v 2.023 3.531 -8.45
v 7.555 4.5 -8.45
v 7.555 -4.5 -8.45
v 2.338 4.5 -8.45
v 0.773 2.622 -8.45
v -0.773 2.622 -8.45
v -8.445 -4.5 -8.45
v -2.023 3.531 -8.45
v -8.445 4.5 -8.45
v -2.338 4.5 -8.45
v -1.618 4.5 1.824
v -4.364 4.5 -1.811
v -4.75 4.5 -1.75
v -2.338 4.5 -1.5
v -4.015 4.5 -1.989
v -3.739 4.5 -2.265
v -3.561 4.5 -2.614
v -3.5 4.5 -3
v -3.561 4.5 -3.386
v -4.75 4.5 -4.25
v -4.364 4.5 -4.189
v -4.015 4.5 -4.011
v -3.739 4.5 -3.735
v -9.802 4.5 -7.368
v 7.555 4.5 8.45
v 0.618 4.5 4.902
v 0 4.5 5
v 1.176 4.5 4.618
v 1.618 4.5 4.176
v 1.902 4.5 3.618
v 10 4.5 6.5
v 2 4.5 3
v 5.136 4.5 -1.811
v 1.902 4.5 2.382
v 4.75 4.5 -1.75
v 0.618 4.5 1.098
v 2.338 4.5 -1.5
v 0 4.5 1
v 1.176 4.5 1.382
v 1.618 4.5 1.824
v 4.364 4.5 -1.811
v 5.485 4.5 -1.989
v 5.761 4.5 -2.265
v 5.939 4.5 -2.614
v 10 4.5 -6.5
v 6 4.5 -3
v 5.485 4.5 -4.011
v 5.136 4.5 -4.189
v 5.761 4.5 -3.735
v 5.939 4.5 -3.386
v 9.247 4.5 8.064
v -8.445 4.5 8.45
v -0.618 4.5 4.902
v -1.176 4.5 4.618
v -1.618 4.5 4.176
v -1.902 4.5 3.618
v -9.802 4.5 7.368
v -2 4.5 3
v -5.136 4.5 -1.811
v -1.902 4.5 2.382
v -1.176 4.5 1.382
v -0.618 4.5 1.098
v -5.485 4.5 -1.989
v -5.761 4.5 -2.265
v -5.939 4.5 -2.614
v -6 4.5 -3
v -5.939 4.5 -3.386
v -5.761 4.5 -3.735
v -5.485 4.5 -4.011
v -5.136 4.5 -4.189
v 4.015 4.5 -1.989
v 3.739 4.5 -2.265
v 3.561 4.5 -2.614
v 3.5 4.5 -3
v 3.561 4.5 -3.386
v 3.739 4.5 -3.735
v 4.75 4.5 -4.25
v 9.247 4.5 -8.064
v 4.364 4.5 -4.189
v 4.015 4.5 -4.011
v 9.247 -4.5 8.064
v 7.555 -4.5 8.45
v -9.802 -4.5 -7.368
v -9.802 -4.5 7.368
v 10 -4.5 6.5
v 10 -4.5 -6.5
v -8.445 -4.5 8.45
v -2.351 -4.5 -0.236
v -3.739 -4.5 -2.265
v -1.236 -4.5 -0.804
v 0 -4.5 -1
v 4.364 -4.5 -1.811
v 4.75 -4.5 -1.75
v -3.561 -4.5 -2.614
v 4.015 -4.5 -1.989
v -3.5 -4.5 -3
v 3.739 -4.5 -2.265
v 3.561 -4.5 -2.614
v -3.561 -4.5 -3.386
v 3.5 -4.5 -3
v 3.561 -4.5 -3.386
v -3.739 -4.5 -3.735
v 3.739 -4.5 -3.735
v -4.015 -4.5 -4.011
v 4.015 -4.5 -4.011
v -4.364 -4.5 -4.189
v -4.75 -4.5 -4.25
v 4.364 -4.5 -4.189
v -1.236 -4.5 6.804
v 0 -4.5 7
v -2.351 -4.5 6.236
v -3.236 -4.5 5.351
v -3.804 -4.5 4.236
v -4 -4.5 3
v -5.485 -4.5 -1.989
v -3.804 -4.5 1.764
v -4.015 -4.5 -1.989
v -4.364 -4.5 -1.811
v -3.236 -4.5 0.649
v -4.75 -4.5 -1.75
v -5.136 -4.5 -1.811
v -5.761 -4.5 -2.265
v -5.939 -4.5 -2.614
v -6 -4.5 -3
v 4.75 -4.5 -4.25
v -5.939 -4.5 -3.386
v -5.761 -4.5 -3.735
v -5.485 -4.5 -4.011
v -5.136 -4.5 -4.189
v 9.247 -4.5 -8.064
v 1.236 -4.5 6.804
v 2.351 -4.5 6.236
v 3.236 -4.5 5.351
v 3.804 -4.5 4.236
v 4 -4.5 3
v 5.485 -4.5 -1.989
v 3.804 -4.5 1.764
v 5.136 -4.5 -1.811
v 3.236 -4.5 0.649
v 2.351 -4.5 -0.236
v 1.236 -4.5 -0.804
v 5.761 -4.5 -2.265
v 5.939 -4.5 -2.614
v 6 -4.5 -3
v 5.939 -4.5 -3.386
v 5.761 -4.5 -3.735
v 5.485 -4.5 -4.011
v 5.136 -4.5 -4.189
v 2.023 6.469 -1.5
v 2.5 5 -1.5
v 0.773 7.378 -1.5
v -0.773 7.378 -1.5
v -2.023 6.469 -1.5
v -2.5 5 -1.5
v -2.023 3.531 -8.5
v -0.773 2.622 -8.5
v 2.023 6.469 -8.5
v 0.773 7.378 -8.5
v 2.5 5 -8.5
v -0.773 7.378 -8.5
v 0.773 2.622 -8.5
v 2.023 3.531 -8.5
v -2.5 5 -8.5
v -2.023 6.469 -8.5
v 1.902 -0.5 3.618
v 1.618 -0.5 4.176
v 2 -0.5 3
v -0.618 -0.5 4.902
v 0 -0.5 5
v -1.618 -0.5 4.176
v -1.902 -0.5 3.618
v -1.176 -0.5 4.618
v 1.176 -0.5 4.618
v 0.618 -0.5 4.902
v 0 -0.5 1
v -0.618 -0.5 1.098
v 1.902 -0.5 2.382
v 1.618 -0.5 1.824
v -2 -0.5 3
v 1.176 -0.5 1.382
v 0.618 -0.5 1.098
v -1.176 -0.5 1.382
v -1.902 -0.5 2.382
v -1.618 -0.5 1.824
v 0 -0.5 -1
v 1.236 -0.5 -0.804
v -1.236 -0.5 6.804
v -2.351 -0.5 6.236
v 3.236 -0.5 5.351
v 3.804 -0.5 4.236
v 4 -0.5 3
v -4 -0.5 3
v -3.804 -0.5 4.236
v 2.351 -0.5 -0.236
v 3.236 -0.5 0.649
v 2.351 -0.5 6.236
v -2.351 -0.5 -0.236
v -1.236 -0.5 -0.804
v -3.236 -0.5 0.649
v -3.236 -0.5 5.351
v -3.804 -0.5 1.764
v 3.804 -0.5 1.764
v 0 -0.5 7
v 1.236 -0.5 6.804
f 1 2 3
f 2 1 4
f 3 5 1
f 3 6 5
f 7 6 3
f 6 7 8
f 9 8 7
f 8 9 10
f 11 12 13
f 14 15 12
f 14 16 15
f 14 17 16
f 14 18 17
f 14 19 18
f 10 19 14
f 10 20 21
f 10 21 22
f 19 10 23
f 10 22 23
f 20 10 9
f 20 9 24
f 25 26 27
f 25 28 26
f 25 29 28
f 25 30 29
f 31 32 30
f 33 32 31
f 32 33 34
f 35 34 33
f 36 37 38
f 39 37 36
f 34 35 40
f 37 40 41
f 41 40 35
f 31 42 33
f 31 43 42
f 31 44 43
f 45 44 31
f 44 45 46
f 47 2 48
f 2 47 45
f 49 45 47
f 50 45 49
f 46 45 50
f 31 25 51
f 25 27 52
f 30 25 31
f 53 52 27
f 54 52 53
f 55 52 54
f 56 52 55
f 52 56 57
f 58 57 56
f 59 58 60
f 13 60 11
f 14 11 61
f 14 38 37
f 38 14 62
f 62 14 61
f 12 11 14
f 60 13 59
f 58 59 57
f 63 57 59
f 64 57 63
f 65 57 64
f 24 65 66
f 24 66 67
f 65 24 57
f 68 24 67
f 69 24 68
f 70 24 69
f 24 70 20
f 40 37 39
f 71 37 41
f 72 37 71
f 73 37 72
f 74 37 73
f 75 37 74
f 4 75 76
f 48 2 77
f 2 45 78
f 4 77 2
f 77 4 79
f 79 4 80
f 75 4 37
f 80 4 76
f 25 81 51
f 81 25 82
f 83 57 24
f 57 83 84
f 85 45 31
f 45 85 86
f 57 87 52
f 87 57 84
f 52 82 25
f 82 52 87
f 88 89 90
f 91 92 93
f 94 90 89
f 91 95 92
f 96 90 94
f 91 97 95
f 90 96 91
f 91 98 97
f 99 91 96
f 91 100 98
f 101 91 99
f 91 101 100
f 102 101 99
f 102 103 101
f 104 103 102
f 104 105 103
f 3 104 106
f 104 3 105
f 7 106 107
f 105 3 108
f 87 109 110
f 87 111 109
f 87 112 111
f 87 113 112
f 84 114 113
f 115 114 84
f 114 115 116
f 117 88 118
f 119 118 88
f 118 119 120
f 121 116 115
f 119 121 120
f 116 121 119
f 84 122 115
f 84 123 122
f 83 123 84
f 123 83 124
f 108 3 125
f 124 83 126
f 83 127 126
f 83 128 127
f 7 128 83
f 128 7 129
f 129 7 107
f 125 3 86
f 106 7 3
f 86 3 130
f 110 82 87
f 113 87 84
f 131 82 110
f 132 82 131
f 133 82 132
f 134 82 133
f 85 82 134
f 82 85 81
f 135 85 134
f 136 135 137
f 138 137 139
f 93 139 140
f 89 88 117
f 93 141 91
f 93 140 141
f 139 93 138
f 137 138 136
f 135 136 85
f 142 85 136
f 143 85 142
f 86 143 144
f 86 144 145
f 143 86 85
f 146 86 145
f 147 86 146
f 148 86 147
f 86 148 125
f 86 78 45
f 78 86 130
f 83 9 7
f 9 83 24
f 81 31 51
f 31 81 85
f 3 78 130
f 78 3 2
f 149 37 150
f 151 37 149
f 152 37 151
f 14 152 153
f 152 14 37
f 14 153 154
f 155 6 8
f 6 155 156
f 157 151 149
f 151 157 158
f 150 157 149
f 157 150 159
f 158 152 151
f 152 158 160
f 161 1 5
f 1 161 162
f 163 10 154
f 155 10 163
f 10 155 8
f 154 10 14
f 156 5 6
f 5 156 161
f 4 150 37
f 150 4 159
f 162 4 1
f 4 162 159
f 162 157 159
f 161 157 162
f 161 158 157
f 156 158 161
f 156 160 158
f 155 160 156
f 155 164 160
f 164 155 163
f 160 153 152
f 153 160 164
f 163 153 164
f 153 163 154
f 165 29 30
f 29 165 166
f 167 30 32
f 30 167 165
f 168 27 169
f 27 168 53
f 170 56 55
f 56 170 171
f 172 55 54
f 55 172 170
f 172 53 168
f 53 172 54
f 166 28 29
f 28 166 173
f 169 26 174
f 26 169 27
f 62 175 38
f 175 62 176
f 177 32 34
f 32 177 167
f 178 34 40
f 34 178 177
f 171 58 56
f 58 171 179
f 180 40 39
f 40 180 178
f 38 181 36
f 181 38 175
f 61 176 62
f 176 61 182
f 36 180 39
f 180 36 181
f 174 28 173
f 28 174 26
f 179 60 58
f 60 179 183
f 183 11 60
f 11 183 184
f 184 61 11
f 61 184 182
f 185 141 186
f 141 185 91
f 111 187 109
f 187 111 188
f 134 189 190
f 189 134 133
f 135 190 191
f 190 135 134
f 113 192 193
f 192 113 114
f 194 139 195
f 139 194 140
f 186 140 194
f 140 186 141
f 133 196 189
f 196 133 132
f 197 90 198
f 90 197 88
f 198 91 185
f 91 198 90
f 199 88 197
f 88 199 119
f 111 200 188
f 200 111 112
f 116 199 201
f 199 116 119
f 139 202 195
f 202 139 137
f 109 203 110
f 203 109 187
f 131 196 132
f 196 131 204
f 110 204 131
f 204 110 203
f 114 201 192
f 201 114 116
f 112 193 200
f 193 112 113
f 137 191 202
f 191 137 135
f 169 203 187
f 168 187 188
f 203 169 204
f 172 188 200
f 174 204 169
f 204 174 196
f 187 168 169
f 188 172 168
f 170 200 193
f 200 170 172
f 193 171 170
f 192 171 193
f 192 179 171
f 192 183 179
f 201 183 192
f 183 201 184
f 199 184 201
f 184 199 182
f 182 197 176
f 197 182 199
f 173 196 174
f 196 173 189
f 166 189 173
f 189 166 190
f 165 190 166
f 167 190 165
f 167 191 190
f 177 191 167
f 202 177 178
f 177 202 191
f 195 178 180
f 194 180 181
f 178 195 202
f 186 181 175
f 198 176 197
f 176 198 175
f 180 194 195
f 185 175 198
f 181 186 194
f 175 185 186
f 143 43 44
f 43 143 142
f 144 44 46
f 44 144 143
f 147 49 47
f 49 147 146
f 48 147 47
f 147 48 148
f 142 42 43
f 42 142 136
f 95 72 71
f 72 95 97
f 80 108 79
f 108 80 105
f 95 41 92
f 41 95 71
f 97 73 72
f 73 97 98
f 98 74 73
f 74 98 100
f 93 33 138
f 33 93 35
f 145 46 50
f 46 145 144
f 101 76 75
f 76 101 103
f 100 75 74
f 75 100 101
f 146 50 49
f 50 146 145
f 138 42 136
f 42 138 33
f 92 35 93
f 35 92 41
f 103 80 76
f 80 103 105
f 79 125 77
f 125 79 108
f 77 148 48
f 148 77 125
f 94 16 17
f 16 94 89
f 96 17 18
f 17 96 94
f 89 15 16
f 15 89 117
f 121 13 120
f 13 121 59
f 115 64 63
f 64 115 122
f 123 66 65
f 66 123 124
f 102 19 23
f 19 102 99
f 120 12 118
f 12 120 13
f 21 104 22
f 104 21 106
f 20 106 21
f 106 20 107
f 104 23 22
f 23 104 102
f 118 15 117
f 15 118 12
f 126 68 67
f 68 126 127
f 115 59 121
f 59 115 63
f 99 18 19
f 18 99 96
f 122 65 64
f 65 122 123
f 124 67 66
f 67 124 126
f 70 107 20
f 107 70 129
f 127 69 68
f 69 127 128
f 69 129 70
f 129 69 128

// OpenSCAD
//This is based on the Atom 3dp design

extrusion = 20;
err = 0.2;
channelWidth= 4;
channelWidthInside=8.5;
channelDeep = 6;

outRoundness = .5*extrusion;
innerRoundness = 0.2*extrusion;
endRoundness = 0.08* extrusion;

armLength = extrusion * 2.7;


//height = extrusion;

sqrt3 = 1.7321;

m25ScrewRadius = 1.25; 

m4ScrewRadius = 2.0; //for M4 bolt
m4ScrewHeadRadius = 4.0; 
m4NutRadius = 4.3;

m5NutRadius = 8/sqrt3+0.2;

m3ScrewRadius = 1.5; //for M3 bolt
m3ScrewHeadRadius = 3.0; 
m3NutRadius = 3.5; //

module endstop(){
    difference(){
	
	union(){
	    minkowski(){
		cube([16,8,13],center=true);
		rotate([90,0,0])cylinder(r=2,h=1,center=true);
	    }
	    translate([0,5,-5])cylinder(r=2.5, h=7,center=true,$fn=10);
	}

	translate([0,0,3])rotate([90,0,0])cylinder(r=m4ScrewRadius, h=20,center=true,$fn=20);
	translate([0,-3.5,3])rotate([90,0,0])cylinder(r=m4ScrewHeadRadius, h=6,center=true,$fn=20);
	

	translate([4.75,0,-3])rotate([90,0,0])cylinder(r=m25ScrewRadius, h=20,center=true,$fn=20);
	translate([-4.75,0,-3])rotate([90,0,0])cylinder(r=m25ScrewRadius, h=20,center=true,$fn=20);
    }
    
}

endstop();
